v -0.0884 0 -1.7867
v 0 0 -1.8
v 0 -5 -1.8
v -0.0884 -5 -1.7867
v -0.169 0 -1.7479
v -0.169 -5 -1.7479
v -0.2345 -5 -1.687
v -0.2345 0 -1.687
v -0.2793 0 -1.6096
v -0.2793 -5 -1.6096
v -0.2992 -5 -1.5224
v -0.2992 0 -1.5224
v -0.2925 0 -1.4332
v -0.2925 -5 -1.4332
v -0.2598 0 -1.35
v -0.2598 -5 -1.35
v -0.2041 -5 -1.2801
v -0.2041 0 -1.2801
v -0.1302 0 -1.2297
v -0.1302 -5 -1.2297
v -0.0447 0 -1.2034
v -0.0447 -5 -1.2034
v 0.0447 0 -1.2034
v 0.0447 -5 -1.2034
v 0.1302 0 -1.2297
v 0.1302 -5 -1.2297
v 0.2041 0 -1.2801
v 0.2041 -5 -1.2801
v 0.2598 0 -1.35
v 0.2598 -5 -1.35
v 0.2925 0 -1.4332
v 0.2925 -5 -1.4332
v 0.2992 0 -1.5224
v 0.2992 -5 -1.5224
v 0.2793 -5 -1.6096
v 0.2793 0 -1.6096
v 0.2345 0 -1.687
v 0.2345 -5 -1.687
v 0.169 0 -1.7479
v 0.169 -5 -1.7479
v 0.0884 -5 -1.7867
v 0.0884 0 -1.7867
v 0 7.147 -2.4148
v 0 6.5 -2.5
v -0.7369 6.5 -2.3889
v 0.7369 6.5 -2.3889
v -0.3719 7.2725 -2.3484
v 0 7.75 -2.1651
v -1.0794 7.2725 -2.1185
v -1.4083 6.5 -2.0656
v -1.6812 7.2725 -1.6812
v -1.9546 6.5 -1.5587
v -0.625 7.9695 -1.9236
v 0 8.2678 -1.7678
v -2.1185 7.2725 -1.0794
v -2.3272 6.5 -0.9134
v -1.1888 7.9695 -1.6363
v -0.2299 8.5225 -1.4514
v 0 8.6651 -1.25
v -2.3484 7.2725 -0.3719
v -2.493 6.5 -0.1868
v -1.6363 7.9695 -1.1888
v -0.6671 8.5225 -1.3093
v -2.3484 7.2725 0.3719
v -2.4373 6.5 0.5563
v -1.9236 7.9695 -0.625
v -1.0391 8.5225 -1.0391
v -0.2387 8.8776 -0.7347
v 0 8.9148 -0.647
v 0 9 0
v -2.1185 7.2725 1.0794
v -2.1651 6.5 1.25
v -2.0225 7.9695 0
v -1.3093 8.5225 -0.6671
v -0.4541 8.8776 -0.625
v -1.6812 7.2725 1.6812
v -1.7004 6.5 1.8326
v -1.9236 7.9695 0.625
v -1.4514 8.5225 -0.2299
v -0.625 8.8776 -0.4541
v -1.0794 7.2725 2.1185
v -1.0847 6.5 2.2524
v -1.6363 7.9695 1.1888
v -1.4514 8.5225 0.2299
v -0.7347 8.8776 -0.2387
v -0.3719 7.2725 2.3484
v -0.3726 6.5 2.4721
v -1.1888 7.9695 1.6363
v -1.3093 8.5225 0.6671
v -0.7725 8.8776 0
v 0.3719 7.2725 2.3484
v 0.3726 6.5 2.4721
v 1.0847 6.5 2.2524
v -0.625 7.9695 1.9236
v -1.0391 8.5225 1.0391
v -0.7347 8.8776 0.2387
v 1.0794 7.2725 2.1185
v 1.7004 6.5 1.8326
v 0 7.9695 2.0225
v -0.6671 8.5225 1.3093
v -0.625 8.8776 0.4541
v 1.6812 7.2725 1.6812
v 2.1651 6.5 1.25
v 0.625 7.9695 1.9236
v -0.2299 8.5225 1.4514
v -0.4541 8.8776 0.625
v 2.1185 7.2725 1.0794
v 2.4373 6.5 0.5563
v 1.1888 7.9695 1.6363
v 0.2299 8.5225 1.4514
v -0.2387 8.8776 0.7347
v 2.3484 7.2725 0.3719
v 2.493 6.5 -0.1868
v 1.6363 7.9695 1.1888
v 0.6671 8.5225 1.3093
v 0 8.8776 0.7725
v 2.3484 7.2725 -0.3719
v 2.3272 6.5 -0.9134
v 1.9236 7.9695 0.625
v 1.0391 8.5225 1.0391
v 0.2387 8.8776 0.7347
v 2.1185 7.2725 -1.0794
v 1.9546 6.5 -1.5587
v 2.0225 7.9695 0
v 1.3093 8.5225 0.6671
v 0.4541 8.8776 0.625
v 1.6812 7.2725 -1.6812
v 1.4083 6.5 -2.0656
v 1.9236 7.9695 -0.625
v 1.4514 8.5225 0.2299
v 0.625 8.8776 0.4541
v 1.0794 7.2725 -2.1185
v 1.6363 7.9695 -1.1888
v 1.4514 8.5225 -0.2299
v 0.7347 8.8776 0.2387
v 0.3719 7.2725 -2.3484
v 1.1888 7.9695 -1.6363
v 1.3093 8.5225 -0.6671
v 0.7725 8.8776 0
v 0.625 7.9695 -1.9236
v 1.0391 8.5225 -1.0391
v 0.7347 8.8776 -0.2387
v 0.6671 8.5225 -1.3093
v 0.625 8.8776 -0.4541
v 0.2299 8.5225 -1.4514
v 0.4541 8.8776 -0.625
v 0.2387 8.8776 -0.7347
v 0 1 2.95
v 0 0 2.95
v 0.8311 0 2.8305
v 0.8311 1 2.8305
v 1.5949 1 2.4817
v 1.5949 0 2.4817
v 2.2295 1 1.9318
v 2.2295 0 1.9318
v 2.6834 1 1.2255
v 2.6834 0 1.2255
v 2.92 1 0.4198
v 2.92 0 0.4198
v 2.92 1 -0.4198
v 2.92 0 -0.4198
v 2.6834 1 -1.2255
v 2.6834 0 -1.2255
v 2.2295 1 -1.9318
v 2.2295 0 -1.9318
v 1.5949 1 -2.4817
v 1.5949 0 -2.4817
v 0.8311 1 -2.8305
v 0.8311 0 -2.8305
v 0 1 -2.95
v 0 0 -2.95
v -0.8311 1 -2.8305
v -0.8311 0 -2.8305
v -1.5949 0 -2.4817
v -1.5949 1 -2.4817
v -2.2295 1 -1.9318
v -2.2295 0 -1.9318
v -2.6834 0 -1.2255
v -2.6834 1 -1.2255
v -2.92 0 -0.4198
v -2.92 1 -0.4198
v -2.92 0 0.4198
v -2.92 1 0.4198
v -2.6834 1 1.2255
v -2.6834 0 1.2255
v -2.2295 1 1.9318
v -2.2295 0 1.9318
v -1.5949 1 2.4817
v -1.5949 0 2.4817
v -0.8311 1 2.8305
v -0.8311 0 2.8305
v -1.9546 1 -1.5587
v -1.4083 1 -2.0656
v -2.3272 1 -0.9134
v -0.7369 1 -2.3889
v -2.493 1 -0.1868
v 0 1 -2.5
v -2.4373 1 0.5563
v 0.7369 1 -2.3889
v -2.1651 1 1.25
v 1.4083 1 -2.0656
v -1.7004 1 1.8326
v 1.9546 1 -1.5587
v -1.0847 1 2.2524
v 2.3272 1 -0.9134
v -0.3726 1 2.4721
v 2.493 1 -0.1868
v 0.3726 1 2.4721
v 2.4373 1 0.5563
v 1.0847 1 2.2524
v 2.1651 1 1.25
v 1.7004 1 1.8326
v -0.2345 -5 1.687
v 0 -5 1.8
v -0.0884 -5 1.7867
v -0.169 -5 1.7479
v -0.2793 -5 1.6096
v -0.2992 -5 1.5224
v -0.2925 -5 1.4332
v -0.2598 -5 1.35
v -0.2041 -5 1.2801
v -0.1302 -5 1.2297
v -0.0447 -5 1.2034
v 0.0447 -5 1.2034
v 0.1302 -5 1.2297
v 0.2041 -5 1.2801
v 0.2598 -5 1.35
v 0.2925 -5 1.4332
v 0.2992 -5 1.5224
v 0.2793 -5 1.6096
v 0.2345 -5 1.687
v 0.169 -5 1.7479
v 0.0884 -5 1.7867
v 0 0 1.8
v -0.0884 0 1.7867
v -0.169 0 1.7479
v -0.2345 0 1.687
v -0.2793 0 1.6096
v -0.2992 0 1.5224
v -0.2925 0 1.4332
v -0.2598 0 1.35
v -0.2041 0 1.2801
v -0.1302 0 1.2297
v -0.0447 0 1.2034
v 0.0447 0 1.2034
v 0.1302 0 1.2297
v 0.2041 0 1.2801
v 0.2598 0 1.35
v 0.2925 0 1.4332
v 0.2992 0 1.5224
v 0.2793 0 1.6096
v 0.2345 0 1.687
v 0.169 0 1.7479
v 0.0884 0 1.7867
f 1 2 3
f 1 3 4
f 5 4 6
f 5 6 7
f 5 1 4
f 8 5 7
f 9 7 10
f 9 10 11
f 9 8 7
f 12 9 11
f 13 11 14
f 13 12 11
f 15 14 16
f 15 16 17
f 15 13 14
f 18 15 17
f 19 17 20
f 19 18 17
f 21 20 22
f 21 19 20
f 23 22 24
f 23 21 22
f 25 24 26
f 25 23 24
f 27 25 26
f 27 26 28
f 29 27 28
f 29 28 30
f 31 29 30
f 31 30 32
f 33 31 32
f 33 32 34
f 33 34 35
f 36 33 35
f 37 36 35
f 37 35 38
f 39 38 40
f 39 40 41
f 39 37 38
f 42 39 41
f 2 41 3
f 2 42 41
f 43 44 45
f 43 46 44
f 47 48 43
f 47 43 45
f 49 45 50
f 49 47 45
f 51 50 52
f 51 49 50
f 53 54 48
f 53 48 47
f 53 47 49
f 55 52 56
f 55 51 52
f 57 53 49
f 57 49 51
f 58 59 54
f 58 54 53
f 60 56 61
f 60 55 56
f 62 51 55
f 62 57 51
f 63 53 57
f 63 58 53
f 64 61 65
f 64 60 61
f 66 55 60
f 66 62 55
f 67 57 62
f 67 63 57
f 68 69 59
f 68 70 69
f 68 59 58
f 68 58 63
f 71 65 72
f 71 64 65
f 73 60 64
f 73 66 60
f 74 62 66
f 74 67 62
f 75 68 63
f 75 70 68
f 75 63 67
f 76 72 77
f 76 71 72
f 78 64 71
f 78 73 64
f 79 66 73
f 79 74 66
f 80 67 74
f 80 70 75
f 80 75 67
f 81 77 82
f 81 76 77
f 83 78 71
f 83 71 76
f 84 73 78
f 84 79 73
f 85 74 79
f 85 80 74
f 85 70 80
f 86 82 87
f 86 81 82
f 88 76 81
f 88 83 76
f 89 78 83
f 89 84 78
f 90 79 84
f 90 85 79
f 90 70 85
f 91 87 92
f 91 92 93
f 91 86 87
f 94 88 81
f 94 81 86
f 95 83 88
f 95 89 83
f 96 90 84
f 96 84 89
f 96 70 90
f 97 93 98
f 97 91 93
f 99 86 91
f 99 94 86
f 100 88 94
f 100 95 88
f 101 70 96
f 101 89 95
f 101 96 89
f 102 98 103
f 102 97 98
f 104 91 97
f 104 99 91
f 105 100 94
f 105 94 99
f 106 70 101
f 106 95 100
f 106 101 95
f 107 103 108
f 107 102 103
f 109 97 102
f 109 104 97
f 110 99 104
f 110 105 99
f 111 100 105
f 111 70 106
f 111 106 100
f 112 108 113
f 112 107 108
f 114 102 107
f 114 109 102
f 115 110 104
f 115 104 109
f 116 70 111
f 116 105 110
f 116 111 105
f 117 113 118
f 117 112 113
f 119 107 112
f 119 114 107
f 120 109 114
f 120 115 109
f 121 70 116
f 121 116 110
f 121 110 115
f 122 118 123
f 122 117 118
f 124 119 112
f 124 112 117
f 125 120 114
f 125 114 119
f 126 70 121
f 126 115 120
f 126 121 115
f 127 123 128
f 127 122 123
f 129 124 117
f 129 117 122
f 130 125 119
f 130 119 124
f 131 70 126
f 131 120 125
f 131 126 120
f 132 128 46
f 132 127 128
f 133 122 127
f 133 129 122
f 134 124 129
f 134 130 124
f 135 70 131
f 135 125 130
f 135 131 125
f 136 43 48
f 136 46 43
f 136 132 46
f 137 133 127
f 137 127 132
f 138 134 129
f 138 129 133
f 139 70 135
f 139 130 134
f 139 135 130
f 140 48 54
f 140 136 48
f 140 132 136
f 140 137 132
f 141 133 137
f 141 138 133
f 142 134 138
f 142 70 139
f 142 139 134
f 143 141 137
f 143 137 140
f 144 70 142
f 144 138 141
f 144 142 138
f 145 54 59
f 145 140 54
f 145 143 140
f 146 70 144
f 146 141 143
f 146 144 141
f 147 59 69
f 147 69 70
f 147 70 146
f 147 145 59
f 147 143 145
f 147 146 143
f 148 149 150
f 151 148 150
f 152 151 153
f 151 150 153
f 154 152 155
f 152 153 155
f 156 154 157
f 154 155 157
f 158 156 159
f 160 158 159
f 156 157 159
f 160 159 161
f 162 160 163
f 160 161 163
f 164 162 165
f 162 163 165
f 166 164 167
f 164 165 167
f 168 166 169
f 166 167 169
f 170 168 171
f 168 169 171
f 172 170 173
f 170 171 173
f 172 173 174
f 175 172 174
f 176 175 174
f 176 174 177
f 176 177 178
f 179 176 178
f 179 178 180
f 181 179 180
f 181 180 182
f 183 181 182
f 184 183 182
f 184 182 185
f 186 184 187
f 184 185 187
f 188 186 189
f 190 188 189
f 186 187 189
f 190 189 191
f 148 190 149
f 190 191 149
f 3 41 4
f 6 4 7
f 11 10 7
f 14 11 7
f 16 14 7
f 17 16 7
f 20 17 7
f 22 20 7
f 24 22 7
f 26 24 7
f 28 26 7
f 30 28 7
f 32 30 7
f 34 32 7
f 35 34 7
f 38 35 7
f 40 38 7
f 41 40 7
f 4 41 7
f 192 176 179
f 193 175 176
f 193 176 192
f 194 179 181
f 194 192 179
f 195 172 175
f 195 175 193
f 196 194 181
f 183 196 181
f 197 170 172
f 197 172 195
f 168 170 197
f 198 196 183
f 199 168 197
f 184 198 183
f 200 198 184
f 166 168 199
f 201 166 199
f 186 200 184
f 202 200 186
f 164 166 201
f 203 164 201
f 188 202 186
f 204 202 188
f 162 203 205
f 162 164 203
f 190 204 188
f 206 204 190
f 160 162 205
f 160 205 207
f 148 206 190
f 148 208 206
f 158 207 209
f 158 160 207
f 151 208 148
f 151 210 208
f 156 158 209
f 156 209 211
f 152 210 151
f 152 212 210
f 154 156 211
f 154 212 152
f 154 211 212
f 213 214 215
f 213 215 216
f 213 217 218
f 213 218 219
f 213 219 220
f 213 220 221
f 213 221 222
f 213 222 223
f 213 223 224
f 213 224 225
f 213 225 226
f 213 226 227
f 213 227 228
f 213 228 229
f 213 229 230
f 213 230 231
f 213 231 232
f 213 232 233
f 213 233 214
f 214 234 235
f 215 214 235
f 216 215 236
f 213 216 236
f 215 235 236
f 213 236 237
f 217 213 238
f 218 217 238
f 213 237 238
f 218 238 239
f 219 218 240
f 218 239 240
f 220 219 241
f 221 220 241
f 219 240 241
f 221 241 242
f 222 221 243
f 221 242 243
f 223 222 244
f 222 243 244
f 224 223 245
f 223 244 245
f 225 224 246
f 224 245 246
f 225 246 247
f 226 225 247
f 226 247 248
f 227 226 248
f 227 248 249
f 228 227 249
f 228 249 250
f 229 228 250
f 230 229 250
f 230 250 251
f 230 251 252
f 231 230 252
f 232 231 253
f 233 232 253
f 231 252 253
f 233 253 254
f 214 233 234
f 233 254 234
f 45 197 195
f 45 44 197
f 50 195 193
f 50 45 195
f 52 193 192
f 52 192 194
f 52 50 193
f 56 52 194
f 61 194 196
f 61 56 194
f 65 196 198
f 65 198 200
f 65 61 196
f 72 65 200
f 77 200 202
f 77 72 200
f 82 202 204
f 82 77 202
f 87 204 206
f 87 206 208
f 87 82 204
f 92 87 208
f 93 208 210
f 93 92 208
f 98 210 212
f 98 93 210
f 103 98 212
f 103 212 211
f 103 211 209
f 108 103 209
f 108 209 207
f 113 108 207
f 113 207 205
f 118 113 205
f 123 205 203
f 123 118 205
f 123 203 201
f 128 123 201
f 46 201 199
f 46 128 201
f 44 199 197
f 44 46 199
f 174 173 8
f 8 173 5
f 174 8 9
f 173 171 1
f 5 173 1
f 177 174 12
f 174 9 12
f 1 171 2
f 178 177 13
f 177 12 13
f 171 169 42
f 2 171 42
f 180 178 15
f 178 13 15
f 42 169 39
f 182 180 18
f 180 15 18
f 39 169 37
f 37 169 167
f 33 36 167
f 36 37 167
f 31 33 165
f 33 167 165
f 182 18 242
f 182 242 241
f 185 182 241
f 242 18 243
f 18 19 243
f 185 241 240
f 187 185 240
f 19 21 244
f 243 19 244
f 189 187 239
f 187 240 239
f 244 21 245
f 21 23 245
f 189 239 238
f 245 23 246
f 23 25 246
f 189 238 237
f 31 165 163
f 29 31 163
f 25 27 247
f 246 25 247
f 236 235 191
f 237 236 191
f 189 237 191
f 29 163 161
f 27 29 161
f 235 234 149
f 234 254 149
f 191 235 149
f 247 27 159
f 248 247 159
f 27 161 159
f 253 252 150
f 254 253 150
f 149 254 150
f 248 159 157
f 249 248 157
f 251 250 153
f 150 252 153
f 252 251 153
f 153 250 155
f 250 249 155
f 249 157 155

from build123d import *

# Parameters (mm, degrees)
SKETCH1_R           = 2.95
BOSS_EXTRUDE1_DEPTH = 1
SKETCH5_R           = 0.3
BOSS_EXTRUDE2_DEPTH = 5


with BuildPart() as part:
    # Sketch1 → Boss-Extrude1 (new body)
    with BuildSketch(Plane(origin=(0, 0, 0), x_dir=(1, 0, 0), z_dir=(0, 1, 0))):
        with Locations(Location((0, 0, 0), (0, 0, 270))):
            Circle(SKETCH1_R)
    extrude(amount=BOSS_EXTRUDE1_DEPTH)

    # Sketch3 → Revolve1 (revolve)
    with BuildSketch(Plane.XY, mode=Mode.PRIVATE) as revolve1_sk:
        with BuildLine():
            Line((0, 1), (2.5, 1))
            Line((2.5, 1), (2.5, 6.5))
            ThreePointArc((2.5, 6.5), (1.767766953, 8.267766953), (0, 9))
            Line((0, 9), (0, 6.5))
            Line((0, 6.5), (0, 1))
        make_face()
    revolve(revolve1_sk.sketch.rotate(Axis((0, 1, 0), (0, 1, 0)), 90), axis=Axis((0, 1, 0), (0, 1, 0)))

    # Sketch5 → Boss-Extrude2 (add)
    with BuildSketch(Plane.XZ):
        with Locations(Location((0, 1.5, 0), (0, 0, 90))):
            Circle(SKETCH5_R)
    boss_extrude2 = extrude(amount=BOSS_EXTRUDE2_DEPTH)

    # Mirror1: Boss-Extrude2 across plane
    add(boss_extrude2.mirror(Plane.XY))


solid = part.part
